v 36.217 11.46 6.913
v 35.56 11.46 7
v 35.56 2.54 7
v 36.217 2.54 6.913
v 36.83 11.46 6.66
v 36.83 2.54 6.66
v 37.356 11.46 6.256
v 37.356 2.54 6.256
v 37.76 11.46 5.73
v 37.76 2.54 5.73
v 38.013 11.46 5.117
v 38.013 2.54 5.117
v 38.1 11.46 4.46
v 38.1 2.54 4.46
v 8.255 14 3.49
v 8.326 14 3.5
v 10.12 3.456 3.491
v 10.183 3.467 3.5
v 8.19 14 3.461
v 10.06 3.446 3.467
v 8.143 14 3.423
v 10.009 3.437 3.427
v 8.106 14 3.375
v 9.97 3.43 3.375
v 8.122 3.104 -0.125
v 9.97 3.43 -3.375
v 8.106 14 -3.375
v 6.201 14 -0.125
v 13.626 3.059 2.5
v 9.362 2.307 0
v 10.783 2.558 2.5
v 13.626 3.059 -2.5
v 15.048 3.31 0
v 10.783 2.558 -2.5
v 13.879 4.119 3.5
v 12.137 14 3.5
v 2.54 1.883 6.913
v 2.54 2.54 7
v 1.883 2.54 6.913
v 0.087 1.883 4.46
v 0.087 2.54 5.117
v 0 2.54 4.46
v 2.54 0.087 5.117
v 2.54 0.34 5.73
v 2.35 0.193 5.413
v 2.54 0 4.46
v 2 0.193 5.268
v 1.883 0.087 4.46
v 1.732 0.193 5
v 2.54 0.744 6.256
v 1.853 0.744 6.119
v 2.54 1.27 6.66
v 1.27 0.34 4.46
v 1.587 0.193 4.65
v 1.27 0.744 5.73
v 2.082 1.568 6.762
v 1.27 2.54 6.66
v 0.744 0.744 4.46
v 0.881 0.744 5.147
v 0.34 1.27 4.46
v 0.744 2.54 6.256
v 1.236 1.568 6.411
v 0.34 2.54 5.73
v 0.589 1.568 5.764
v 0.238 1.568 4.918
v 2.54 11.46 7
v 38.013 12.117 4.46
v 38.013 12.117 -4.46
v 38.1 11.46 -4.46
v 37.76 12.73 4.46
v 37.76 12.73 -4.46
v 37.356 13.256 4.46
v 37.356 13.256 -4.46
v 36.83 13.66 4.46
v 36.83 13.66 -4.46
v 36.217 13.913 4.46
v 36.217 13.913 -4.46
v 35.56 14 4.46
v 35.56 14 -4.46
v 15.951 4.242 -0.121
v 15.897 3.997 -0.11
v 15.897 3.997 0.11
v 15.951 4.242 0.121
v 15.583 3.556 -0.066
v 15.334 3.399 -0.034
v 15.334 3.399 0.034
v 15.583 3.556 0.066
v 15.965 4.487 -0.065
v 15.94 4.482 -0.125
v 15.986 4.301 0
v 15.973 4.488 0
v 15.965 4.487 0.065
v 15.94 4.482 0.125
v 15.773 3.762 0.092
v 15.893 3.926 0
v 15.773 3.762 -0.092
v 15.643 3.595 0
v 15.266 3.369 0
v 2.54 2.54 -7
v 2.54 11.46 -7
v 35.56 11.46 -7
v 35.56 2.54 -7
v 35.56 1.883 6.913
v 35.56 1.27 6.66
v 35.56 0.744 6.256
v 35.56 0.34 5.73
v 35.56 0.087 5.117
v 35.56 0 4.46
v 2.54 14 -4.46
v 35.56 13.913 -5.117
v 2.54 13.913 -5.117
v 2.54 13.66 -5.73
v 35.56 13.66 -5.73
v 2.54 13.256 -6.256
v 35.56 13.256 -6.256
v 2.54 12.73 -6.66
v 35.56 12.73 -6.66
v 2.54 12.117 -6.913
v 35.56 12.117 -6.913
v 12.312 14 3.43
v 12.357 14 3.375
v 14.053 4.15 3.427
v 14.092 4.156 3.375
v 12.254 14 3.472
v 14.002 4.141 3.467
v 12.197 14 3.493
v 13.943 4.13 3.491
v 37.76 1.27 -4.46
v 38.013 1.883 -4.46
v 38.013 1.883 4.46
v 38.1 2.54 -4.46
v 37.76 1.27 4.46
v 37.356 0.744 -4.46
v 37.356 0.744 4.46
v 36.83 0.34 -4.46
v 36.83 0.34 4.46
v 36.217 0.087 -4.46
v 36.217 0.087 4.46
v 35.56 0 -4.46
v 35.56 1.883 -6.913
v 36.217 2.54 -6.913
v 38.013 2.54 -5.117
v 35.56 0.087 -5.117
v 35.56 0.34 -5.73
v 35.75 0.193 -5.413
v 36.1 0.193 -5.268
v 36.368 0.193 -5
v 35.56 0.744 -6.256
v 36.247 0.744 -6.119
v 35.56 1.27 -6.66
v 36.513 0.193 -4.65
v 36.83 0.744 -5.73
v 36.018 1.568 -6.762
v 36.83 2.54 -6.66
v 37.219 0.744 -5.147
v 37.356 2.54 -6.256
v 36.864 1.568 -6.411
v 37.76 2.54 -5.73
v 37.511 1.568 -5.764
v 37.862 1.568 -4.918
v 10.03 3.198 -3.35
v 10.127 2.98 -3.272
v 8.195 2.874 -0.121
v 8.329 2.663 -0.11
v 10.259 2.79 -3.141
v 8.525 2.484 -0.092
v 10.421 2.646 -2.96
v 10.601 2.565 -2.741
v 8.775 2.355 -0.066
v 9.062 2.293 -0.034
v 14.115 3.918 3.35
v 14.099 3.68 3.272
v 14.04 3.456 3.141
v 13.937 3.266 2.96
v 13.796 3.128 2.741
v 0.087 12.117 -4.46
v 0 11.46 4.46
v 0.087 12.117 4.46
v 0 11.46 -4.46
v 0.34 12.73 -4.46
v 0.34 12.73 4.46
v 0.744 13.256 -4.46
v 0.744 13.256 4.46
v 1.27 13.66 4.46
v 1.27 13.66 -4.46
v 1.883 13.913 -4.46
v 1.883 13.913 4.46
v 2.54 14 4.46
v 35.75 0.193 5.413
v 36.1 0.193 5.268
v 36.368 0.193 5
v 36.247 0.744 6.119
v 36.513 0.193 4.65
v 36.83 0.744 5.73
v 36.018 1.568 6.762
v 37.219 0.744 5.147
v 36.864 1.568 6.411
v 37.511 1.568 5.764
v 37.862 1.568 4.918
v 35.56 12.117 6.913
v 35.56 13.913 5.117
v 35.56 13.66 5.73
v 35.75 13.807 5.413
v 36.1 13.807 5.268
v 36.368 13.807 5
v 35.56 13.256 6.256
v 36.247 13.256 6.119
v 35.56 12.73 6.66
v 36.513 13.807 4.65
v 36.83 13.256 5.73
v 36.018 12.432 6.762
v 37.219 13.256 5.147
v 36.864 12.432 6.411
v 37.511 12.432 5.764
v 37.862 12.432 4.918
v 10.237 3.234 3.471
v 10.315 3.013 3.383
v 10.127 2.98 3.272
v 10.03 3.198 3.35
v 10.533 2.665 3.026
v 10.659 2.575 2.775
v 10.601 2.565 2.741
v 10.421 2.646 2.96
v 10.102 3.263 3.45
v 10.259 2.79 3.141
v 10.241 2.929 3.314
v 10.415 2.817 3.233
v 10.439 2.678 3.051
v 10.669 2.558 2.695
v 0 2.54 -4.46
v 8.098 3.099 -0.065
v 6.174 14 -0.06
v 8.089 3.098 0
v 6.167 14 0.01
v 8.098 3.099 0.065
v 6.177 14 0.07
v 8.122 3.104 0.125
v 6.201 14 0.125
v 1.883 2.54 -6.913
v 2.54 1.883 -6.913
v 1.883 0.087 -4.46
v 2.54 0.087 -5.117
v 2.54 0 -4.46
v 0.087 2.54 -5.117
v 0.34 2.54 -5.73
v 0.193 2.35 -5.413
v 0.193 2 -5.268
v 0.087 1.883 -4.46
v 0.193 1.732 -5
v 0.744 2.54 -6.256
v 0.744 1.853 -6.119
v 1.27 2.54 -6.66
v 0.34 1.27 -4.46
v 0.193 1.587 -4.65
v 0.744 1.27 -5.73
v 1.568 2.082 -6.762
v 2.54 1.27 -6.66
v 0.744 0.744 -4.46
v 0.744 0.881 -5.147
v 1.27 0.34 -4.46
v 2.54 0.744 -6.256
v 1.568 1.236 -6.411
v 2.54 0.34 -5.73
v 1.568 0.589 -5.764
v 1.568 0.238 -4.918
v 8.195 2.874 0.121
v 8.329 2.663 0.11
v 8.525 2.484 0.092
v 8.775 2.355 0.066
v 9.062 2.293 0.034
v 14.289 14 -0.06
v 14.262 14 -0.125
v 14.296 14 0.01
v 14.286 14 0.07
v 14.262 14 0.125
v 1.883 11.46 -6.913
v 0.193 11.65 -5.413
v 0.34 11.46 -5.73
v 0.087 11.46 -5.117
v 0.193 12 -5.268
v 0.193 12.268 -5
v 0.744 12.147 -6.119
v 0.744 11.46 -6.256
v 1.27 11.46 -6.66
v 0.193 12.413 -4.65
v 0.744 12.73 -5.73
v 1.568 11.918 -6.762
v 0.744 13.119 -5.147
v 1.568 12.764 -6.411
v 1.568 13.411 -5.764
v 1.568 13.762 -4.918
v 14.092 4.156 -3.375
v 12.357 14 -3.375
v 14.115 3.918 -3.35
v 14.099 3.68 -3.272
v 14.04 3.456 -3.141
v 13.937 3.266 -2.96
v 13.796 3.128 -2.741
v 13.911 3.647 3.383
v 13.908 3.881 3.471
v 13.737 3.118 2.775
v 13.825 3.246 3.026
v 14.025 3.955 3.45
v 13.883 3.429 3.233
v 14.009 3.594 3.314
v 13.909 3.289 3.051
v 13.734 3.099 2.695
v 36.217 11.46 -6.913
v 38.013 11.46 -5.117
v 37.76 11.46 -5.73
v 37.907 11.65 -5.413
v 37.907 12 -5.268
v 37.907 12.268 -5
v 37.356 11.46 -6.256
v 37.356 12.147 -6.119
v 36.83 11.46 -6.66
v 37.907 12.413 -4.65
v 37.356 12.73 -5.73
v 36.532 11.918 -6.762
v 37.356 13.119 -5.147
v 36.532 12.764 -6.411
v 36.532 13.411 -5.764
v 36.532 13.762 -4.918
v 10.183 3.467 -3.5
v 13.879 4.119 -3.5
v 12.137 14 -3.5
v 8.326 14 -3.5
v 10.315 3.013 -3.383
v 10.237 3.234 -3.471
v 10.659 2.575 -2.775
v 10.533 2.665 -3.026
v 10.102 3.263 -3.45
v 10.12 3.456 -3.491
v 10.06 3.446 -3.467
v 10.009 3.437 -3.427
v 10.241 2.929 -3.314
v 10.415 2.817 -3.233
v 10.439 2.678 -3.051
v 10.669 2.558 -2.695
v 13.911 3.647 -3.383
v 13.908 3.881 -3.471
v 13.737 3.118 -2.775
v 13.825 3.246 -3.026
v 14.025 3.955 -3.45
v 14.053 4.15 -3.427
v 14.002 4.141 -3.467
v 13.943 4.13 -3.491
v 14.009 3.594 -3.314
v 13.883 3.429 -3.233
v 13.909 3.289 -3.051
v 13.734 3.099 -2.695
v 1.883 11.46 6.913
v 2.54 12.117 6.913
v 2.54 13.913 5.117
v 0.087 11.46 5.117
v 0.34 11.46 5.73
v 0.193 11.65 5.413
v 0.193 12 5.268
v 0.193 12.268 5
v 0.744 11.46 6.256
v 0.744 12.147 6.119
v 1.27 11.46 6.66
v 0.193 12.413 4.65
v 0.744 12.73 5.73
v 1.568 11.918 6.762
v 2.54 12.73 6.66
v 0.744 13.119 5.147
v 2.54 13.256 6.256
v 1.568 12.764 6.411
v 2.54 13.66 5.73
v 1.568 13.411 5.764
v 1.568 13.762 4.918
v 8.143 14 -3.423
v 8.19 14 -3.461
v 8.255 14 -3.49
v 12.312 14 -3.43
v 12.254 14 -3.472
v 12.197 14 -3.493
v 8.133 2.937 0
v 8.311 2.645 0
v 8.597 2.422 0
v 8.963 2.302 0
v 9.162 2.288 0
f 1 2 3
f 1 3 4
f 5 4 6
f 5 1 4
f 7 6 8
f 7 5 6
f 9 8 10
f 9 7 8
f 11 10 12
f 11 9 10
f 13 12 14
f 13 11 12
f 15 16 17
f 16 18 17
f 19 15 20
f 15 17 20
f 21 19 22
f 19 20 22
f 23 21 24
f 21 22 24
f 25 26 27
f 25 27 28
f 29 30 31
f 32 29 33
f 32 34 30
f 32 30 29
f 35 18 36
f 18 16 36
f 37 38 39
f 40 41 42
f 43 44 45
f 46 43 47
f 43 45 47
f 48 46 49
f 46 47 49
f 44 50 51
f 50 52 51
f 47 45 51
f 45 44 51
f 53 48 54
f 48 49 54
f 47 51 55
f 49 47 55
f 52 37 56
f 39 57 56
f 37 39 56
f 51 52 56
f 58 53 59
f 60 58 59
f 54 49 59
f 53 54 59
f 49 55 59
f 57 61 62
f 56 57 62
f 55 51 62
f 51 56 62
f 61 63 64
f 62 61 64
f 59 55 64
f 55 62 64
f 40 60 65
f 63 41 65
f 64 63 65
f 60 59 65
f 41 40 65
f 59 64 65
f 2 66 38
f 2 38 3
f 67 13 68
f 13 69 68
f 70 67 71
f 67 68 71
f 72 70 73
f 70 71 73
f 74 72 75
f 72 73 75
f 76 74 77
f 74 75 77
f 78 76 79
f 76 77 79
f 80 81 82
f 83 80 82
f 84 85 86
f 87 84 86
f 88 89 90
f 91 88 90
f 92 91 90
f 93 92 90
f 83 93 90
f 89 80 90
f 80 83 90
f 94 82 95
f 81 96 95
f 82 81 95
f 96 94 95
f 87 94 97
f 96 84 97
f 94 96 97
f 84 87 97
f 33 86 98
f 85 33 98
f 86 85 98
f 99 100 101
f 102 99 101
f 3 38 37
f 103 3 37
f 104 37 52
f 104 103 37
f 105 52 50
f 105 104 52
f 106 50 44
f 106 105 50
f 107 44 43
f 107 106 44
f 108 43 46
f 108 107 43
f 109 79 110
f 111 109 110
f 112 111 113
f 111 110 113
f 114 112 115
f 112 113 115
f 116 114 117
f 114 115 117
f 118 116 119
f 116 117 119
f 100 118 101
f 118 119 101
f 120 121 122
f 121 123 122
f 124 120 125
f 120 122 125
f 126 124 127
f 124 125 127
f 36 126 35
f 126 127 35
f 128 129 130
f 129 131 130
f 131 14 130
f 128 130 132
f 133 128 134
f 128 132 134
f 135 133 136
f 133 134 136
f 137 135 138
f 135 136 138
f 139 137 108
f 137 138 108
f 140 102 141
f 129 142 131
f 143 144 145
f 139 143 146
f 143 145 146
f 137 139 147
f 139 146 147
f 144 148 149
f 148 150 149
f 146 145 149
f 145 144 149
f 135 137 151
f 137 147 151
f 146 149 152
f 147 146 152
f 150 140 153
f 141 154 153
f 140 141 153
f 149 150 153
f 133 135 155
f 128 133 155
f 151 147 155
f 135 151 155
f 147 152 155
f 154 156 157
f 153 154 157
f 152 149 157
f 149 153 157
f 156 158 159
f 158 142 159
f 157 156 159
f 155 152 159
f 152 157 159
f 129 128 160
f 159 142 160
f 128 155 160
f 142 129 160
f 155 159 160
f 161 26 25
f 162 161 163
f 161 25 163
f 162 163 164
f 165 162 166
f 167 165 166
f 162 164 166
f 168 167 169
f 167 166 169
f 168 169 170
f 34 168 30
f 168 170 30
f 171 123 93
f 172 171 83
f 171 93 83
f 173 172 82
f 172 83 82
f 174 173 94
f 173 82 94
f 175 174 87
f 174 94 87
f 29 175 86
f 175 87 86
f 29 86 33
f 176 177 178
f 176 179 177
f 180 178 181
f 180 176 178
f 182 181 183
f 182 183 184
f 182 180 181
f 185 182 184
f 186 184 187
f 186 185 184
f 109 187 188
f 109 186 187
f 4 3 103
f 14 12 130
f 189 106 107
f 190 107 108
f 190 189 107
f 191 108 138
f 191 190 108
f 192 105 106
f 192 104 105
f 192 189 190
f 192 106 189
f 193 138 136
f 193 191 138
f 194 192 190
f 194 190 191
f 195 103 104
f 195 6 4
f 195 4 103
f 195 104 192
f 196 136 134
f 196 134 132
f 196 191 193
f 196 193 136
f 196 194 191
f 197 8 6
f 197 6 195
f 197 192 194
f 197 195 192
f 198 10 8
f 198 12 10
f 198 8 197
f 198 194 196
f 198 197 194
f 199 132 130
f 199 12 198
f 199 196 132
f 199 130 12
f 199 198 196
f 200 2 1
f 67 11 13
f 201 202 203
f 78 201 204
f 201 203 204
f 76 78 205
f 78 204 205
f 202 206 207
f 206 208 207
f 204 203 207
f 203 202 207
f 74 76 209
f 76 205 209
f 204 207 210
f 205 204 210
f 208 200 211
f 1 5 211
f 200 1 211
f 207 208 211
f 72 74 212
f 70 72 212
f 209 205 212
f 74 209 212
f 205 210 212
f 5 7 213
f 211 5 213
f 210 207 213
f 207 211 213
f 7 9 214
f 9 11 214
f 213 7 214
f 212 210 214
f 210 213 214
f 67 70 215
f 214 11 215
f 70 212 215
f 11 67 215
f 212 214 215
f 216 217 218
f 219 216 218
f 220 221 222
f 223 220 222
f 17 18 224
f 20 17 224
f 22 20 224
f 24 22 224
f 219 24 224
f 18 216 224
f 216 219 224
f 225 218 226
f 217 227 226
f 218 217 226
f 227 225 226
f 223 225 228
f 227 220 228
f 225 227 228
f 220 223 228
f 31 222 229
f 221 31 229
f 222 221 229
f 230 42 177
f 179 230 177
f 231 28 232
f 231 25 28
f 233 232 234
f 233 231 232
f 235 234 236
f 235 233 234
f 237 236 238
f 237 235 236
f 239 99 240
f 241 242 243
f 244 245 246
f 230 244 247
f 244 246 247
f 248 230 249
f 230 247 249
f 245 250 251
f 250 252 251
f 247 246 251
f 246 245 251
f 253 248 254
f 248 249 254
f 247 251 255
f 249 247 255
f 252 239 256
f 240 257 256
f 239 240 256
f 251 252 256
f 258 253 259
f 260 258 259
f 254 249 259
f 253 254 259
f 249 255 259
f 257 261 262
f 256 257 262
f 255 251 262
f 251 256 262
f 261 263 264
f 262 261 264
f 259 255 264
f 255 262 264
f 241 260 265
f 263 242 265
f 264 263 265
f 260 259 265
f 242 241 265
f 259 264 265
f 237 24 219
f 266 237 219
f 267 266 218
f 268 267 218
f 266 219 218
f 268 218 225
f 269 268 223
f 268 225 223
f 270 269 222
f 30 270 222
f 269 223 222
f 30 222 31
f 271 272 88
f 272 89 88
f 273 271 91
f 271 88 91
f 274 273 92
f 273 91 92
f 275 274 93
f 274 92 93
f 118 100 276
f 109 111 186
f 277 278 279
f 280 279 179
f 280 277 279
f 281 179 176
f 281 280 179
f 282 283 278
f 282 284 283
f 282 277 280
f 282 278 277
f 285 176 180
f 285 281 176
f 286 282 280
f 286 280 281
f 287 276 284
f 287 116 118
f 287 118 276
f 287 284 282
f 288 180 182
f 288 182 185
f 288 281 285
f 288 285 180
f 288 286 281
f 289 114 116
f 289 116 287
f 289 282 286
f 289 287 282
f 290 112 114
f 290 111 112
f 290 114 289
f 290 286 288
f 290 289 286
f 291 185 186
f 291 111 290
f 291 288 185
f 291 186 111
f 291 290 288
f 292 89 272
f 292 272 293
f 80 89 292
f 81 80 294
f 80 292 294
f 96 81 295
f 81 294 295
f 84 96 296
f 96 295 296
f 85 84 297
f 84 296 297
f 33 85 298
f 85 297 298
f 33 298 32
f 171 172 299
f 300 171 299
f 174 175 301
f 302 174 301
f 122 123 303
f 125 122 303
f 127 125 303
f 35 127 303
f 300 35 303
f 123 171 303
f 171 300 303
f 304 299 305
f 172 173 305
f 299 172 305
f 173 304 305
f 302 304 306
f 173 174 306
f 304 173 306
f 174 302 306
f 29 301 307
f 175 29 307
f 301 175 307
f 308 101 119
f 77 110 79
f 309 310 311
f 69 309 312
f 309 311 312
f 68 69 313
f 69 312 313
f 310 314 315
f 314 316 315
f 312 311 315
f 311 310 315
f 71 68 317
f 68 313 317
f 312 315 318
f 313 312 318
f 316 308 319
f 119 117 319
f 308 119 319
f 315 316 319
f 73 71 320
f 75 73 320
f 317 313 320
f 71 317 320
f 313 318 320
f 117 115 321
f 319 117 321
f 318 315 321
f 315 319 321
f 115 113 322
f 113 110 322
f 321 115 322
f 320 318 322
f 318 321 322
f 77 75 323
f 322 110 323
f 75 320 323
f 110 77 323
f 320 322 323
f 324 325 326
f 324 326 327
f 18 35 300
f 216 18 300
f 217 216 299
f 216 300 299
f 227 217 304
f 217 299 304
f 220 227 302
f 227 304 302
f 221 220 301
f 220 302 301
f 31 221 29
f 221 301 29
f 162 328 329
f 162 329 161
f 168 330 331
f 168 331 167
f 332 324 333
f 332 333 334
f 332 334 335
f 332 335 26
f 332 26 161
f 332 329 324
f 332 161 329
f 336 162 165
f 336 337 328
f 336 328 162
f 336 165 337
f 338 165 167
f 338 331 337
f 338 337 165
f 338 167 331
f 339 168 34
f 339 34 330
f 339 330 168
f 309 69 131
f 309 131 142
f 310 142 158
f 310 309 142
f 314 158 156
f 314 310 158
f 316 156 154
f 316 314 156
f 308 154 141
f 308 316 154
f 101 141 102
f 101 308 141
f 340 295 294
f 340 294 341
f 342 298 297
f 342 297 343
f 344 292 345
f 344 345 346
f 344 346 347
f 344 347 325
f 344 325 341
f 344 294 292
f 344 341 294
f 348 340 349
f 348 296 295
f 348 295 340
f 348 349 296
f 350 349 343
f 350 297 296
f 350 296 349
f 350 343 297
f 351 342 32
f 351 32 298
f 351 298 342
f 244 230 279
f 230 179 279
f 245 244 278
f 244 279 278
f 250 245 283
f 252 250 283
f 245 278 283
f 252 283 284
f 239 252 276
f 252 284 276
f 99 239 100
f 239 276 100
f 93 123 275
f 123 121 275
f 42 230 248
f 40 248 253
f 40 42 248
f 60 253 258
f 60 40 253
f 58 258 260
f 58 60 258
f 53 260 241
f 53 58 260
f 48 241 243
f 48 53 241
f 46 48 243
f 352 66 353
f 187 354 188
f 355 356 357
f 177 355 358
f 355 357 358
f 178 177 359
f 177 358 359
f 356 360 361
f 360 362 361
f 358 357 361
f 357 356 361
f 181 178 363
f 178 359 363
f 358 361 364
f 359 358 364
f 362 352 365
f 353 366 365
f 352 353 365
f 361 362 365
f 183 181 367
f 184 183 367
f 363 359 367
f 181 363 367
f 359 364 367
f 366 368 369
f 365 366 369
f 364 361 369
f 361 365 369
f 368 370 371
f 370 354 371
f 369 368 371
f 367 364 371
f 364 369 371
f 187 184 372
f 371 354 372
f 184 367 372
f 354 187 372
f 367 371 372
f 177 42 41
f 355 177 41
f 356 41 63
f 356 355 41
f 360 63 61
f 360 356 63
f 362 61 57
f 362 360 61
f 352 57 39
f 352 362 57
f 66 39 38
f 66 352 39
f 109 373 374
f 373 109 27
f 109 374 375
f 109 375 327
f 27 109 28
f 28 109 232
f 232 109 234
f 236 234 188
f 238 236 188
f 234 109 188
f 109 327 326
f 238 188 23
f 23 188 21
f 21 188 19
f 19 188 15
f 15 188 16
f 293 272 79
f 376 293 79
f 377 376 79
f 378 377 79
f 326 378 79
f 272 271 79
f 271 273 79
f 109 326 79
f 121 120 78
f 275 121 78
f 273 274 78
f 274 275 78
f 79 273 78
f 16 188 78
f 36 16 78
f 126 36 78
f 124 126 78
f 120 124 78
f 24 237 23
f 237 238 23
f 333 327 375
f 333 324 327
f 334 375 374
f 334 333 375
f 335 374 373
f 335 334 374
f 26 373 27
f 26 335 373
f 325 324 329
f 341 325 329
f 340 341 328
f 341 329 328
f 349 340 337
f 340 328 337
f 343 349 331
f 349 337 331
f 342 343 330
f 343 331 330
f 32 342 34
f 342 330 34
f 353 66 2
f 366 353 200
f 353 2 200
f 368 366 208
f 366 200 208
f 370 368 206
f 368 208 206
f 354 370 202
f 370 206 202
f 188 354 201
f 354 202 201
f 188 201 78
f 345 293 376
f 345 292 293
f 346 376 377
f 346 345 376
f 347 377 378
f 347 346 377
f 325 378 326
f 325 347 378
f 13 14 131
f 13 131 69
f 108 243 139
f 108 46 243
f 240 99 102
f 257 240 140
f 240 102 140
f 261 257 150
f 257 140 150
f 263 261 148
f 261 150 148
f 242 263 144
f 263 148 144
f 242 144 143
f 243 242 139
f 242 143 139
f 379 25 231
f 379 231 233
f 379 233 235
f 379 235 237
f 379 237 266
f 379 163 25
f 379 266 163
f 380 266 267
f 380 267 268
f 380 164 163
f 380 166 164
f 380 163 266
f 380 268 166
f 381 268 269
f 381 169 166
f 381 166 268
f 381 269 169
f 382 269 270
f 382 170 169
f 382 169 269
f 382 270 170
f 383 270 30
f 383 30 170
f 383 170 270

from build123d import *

# Parameters (mm, degrees)
SKETCH1_W           = 38.1
SKETCH1_H           = 14
BOSS_EXTRUDE1_DEPTH = 7
FILLET1_R           = 2.54
CUT_EXTRUDE1_DEPTH  = 12.7
FILLET2_R           = 1
FILLET3_R           = 0.25


with BuildPart() as part:
    # Sketch1 → Boss-Extrude1 (new, symmetric)
    with BuildSketch(Plane.XY):
        with Locations((19.05, 7)):
            Rectangle(SKETCH1_W, SKETCH1_H)
    extrude(amount=BOSS_EXTRUDE1_DEPTH, both=True)

    # Fillet1
    fillet1_edges = [part.edges().sort_by_distance(p)[0] for p in [
        (38.1, 7, 7),
        (19.05, 14, 7),
        (0, 7, 7),
        (19.05, 14, -7),
        (38.1, 7, -7),
        (19.05, 0, -7),
        (0, 7, -7),
        (19.05, 0, 7),
        (0, 14, 0),
        (38.1, 14, 0),
        (38.1, 0, 0),
        (0, 0, 0),
    ]]
    fillet(fillet1_edges, radius=FILLET1_R)

    # Sketch3 → Cut-Extrude1 (cut)
    with BuildSketch(Plane(origin=(-2.317550632, 13.143482763, 0), x_dir=(0.9848077530122074, 0.1736481776669347, 0), z_dir=(-0.17364817766693472, 0.9848077530122075, 0))):
        Polygon((16.548510348, 0), (14.527784405, 3.5), (10.486332521, 3.5), (8.465606579, 0), (10.486332521, -3.5), (14.527784405, -3.5), align=None)
    extrude(amount=-CUT_EXTRUDE1_DEPTH, mode=Mode.SUBTRACT)

    # Fillet2
    fillet2_edges = [part.edges().sort_by_distance(p)[0] for p in [
        (15.189869229, 3.334595276, 1.75),
        (12.204829367, 2.80825221, 3.5),
        (9.219789505, 2.281909144, 1.75),
        (9.219789505, 2.281909144, -1.75),
        (12.204829367, 2.80825221, -3.5),
        (15.189869229, 3.334595276, -1.75),
    ]]
    fillet(fillet2_edges, radius=FILLET2_R)

    # Fillet3
    fillet3_edges = [part.edges().sort_by_distance(p)[0] for p in [
        (13.152264465, 9.07197767, 3.5),
        (9.110338994, 8.721082293, 3.5),
        (7.089376258, 8.545634604, 0),
        (9.110338994, 8.721082293, -3.5),
        (13.152264465, 9.07197767, -3.5),
        (15.173227201, 9.247425359, 0),
        (10.349377707, 2.753337988, -3.181429078),
        (13.96716537, 3.391251564, -3.181429078),
        (8.540483876, 2.434381201, 0),
        (15.776059261, 3.71020842, 0),
        (10.349377707, 2.753337988, 3.181429078),
        (13.96716537, 3.391251564, 3.181429078),
    ]]
    fillet(fillet3_edges, radius=FILLET3_R)


solid = part.part
